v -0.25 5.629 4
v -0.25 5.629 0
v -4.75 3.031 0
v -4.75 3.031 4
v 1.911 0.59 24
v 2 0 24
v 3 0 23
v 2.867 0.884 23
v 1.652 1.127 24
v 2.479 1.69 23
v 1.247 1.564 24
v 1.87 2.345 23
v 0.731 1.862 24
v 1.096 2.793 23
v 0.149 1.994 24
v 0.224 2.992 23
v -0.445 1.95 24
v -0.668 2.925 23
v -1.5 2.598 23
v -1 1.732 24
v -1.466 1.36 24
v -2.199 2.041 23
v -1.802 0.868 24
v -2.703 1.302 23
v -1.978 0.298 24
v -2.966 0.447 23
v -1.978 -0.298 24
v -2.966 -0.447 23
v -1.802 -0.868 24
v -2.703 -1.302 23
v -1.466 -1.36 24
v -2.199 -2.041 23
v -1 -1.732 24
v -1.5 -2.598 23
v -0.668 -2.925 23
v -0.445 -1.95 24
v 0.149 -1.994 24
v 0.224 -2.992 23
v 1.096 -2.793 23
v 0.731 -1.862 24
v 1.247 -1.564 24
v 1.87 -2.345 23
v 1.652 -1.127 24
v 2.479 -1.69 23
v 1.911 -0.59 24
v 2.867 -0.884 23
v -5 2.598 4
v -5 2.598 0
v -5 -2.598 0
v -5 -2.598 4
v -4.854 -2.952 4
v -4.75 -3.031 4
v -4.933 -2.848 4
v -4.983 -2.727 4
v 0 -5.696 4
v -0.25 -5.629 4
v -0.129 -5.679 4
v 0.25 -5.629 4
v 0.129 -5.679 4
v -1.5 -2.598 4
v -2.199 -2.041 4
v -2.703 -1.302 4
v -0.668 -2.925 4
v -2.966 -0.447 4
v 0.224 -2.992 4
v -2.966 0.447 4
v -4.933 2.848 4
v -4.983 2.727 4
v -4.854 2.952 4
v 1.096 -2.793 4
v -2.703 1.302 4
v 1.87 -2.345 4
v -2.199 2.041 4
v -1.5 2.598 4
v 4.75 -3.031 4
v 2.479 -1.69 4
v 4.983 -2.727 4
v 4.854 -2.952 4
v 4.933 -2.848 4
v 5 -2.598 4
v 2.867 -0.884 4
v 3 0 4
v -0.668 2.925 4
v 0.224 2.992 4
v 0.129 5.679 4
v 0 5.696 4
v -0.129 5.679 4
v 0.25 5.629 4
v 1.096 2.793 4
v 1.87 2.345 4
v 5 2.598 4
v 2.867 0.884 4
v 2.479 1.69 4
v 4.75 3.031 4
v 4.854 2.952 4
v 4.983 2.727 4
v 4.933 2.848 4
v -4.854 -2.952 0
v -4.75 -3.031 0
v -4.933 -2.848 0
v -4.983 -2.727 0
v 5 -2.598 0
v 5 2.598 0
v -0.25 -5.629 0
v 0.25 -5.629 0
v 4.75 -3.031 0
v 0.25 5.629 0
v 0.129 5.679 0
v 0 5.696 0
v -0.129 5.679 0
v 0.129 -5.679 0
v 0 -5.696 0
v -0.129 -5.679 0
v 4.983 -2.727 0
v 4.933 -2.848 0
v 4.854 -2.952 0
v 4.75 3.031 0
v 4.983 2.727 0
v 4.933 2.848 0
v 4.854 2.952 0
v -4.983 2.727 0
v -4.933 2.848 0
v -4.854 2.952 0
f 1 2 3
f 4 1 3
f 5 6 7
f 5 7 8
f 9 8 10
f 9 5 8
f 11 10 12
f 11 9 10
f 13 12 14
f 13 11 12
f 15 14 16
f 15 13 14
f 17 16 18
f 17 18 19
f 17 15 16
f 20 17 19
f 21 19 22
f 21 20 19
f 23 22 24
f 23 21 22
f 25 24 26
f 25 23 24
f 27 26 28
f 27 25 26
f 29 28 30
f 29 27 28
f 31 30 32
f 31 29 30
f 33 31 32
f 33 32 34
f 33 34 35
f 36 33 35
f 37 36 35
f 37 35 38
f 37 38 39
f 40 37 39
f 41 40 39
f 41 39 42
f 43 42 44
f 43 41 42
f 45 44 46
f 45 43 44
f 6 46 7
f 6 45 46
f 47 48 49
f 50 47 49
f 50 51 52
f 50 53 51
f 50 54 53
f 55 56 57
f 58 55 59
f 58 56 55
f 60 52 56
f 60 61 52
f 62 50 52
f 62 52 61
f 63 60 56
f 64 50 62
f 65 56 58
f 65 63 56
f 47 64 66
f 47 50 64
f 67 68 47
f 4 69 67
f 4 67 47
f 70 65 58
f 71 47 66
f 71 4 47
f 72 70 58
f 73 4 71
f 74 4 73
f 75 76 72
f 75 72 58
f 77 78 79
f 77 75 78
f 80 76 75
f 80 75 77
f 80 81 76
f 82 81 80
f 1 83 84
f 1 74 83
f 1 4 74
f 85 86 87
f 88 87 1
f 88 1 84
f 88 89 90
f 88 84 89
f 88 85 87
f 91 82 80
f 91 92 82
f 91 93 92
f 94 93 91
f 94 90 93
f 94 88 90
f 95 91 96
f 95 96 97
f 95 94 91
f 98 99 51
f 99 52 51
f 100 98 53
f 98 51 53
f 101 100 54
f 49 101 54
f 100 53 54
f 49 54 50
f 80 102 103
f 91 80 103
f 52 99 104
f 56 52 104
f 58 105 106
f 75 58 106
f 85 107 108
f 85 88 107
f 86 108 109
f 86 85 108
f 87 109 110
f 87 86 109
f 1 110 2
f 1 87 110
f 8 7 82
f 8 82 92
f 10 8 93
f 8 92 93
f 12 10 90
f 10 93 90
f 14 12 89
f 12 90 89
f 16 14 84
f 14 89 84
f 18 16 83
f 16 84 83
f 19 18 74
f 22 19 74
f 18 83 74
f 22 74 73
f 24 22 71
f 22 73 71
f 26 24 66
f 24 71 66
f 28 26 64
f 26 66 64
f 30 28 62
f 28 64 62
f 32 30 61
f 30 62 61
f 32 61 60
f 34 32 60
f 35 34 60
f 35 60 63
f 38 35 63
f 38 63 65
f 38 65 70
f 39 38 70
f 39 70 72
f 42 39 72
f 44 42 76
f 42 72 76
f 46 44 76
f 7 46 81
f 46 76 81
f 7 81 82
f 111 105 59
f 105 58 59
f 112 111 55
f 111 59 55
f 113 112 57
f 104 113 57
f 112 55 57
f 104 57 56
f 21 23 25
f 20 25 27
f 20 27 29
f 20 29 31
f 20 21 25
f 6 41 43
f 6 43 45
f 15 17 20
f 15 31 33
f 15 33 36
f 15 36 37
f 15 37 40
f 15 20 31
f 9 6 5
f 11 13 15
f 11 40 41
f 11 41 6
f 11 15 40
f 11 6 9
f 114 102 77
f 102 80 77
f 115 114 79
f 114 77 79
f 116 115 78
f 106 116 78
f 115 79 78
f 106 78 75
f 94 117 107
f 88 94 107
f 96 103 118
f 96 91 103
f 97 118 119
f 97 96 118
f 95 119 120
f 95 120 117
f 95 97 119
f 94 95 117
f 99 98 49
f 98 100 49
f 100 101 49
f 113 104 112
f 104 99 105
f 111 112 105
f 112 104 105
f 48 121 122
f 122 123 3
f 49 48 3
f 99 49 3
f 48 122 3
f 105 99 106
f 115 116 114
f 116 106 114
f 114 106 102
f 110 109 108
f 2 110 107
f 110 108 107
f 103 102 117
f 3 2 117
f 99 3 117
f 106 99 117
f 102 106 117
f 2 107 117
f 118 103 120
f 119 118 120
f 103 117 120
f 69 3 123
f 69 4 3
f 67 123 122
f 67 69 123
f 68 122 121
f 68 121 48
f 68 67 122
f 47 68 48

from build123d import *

# Parameters (mm, degrees)
F1_DEPTH = 4
F2_R     = 3
F3_DEPTH = 20
F4_SIZE  = 1
F5_R     = 0.5


with BuildPart() as f1:
    # F0 (on Top) → F1 (new body)
    with BuildSketch(Plane.XY):
        Polygon((5, -2.886751), (5, 2.886751), (0, 5.773503), (-5, 2.886751), (-5, -2.886751), (0, -5.773503), align=None)
    extrude(amount=F1_DEPTH)

    # F2 (on face) → F3 (join)
    with BuildSketch(Plane.XY.offset(4)):
        Circle(F2_R)
    extrude(amount=F3_DEPTH)

    # F4
    f4_edges = [f1.edges().sort_by_distance(p)[0] for p in [
        (-3, 0, 24),
    ]]
    chamfer(f4_edges, length=F4_SIZE)

    # F5
    f5_edges = [f1.edges().sort_by_distance(p)[0] for p in [
        (0, -5.773503, 2),
        (5, -2.886751, 2),
        (5, 2.886751, 2),
        (-5, -2.886751, 2),
        (0, 5.773503, 2),
        (-5, 2.886751, 2),
    ]]
    fillet(f5_edges, radius=F5_R)


solid = f1.part
